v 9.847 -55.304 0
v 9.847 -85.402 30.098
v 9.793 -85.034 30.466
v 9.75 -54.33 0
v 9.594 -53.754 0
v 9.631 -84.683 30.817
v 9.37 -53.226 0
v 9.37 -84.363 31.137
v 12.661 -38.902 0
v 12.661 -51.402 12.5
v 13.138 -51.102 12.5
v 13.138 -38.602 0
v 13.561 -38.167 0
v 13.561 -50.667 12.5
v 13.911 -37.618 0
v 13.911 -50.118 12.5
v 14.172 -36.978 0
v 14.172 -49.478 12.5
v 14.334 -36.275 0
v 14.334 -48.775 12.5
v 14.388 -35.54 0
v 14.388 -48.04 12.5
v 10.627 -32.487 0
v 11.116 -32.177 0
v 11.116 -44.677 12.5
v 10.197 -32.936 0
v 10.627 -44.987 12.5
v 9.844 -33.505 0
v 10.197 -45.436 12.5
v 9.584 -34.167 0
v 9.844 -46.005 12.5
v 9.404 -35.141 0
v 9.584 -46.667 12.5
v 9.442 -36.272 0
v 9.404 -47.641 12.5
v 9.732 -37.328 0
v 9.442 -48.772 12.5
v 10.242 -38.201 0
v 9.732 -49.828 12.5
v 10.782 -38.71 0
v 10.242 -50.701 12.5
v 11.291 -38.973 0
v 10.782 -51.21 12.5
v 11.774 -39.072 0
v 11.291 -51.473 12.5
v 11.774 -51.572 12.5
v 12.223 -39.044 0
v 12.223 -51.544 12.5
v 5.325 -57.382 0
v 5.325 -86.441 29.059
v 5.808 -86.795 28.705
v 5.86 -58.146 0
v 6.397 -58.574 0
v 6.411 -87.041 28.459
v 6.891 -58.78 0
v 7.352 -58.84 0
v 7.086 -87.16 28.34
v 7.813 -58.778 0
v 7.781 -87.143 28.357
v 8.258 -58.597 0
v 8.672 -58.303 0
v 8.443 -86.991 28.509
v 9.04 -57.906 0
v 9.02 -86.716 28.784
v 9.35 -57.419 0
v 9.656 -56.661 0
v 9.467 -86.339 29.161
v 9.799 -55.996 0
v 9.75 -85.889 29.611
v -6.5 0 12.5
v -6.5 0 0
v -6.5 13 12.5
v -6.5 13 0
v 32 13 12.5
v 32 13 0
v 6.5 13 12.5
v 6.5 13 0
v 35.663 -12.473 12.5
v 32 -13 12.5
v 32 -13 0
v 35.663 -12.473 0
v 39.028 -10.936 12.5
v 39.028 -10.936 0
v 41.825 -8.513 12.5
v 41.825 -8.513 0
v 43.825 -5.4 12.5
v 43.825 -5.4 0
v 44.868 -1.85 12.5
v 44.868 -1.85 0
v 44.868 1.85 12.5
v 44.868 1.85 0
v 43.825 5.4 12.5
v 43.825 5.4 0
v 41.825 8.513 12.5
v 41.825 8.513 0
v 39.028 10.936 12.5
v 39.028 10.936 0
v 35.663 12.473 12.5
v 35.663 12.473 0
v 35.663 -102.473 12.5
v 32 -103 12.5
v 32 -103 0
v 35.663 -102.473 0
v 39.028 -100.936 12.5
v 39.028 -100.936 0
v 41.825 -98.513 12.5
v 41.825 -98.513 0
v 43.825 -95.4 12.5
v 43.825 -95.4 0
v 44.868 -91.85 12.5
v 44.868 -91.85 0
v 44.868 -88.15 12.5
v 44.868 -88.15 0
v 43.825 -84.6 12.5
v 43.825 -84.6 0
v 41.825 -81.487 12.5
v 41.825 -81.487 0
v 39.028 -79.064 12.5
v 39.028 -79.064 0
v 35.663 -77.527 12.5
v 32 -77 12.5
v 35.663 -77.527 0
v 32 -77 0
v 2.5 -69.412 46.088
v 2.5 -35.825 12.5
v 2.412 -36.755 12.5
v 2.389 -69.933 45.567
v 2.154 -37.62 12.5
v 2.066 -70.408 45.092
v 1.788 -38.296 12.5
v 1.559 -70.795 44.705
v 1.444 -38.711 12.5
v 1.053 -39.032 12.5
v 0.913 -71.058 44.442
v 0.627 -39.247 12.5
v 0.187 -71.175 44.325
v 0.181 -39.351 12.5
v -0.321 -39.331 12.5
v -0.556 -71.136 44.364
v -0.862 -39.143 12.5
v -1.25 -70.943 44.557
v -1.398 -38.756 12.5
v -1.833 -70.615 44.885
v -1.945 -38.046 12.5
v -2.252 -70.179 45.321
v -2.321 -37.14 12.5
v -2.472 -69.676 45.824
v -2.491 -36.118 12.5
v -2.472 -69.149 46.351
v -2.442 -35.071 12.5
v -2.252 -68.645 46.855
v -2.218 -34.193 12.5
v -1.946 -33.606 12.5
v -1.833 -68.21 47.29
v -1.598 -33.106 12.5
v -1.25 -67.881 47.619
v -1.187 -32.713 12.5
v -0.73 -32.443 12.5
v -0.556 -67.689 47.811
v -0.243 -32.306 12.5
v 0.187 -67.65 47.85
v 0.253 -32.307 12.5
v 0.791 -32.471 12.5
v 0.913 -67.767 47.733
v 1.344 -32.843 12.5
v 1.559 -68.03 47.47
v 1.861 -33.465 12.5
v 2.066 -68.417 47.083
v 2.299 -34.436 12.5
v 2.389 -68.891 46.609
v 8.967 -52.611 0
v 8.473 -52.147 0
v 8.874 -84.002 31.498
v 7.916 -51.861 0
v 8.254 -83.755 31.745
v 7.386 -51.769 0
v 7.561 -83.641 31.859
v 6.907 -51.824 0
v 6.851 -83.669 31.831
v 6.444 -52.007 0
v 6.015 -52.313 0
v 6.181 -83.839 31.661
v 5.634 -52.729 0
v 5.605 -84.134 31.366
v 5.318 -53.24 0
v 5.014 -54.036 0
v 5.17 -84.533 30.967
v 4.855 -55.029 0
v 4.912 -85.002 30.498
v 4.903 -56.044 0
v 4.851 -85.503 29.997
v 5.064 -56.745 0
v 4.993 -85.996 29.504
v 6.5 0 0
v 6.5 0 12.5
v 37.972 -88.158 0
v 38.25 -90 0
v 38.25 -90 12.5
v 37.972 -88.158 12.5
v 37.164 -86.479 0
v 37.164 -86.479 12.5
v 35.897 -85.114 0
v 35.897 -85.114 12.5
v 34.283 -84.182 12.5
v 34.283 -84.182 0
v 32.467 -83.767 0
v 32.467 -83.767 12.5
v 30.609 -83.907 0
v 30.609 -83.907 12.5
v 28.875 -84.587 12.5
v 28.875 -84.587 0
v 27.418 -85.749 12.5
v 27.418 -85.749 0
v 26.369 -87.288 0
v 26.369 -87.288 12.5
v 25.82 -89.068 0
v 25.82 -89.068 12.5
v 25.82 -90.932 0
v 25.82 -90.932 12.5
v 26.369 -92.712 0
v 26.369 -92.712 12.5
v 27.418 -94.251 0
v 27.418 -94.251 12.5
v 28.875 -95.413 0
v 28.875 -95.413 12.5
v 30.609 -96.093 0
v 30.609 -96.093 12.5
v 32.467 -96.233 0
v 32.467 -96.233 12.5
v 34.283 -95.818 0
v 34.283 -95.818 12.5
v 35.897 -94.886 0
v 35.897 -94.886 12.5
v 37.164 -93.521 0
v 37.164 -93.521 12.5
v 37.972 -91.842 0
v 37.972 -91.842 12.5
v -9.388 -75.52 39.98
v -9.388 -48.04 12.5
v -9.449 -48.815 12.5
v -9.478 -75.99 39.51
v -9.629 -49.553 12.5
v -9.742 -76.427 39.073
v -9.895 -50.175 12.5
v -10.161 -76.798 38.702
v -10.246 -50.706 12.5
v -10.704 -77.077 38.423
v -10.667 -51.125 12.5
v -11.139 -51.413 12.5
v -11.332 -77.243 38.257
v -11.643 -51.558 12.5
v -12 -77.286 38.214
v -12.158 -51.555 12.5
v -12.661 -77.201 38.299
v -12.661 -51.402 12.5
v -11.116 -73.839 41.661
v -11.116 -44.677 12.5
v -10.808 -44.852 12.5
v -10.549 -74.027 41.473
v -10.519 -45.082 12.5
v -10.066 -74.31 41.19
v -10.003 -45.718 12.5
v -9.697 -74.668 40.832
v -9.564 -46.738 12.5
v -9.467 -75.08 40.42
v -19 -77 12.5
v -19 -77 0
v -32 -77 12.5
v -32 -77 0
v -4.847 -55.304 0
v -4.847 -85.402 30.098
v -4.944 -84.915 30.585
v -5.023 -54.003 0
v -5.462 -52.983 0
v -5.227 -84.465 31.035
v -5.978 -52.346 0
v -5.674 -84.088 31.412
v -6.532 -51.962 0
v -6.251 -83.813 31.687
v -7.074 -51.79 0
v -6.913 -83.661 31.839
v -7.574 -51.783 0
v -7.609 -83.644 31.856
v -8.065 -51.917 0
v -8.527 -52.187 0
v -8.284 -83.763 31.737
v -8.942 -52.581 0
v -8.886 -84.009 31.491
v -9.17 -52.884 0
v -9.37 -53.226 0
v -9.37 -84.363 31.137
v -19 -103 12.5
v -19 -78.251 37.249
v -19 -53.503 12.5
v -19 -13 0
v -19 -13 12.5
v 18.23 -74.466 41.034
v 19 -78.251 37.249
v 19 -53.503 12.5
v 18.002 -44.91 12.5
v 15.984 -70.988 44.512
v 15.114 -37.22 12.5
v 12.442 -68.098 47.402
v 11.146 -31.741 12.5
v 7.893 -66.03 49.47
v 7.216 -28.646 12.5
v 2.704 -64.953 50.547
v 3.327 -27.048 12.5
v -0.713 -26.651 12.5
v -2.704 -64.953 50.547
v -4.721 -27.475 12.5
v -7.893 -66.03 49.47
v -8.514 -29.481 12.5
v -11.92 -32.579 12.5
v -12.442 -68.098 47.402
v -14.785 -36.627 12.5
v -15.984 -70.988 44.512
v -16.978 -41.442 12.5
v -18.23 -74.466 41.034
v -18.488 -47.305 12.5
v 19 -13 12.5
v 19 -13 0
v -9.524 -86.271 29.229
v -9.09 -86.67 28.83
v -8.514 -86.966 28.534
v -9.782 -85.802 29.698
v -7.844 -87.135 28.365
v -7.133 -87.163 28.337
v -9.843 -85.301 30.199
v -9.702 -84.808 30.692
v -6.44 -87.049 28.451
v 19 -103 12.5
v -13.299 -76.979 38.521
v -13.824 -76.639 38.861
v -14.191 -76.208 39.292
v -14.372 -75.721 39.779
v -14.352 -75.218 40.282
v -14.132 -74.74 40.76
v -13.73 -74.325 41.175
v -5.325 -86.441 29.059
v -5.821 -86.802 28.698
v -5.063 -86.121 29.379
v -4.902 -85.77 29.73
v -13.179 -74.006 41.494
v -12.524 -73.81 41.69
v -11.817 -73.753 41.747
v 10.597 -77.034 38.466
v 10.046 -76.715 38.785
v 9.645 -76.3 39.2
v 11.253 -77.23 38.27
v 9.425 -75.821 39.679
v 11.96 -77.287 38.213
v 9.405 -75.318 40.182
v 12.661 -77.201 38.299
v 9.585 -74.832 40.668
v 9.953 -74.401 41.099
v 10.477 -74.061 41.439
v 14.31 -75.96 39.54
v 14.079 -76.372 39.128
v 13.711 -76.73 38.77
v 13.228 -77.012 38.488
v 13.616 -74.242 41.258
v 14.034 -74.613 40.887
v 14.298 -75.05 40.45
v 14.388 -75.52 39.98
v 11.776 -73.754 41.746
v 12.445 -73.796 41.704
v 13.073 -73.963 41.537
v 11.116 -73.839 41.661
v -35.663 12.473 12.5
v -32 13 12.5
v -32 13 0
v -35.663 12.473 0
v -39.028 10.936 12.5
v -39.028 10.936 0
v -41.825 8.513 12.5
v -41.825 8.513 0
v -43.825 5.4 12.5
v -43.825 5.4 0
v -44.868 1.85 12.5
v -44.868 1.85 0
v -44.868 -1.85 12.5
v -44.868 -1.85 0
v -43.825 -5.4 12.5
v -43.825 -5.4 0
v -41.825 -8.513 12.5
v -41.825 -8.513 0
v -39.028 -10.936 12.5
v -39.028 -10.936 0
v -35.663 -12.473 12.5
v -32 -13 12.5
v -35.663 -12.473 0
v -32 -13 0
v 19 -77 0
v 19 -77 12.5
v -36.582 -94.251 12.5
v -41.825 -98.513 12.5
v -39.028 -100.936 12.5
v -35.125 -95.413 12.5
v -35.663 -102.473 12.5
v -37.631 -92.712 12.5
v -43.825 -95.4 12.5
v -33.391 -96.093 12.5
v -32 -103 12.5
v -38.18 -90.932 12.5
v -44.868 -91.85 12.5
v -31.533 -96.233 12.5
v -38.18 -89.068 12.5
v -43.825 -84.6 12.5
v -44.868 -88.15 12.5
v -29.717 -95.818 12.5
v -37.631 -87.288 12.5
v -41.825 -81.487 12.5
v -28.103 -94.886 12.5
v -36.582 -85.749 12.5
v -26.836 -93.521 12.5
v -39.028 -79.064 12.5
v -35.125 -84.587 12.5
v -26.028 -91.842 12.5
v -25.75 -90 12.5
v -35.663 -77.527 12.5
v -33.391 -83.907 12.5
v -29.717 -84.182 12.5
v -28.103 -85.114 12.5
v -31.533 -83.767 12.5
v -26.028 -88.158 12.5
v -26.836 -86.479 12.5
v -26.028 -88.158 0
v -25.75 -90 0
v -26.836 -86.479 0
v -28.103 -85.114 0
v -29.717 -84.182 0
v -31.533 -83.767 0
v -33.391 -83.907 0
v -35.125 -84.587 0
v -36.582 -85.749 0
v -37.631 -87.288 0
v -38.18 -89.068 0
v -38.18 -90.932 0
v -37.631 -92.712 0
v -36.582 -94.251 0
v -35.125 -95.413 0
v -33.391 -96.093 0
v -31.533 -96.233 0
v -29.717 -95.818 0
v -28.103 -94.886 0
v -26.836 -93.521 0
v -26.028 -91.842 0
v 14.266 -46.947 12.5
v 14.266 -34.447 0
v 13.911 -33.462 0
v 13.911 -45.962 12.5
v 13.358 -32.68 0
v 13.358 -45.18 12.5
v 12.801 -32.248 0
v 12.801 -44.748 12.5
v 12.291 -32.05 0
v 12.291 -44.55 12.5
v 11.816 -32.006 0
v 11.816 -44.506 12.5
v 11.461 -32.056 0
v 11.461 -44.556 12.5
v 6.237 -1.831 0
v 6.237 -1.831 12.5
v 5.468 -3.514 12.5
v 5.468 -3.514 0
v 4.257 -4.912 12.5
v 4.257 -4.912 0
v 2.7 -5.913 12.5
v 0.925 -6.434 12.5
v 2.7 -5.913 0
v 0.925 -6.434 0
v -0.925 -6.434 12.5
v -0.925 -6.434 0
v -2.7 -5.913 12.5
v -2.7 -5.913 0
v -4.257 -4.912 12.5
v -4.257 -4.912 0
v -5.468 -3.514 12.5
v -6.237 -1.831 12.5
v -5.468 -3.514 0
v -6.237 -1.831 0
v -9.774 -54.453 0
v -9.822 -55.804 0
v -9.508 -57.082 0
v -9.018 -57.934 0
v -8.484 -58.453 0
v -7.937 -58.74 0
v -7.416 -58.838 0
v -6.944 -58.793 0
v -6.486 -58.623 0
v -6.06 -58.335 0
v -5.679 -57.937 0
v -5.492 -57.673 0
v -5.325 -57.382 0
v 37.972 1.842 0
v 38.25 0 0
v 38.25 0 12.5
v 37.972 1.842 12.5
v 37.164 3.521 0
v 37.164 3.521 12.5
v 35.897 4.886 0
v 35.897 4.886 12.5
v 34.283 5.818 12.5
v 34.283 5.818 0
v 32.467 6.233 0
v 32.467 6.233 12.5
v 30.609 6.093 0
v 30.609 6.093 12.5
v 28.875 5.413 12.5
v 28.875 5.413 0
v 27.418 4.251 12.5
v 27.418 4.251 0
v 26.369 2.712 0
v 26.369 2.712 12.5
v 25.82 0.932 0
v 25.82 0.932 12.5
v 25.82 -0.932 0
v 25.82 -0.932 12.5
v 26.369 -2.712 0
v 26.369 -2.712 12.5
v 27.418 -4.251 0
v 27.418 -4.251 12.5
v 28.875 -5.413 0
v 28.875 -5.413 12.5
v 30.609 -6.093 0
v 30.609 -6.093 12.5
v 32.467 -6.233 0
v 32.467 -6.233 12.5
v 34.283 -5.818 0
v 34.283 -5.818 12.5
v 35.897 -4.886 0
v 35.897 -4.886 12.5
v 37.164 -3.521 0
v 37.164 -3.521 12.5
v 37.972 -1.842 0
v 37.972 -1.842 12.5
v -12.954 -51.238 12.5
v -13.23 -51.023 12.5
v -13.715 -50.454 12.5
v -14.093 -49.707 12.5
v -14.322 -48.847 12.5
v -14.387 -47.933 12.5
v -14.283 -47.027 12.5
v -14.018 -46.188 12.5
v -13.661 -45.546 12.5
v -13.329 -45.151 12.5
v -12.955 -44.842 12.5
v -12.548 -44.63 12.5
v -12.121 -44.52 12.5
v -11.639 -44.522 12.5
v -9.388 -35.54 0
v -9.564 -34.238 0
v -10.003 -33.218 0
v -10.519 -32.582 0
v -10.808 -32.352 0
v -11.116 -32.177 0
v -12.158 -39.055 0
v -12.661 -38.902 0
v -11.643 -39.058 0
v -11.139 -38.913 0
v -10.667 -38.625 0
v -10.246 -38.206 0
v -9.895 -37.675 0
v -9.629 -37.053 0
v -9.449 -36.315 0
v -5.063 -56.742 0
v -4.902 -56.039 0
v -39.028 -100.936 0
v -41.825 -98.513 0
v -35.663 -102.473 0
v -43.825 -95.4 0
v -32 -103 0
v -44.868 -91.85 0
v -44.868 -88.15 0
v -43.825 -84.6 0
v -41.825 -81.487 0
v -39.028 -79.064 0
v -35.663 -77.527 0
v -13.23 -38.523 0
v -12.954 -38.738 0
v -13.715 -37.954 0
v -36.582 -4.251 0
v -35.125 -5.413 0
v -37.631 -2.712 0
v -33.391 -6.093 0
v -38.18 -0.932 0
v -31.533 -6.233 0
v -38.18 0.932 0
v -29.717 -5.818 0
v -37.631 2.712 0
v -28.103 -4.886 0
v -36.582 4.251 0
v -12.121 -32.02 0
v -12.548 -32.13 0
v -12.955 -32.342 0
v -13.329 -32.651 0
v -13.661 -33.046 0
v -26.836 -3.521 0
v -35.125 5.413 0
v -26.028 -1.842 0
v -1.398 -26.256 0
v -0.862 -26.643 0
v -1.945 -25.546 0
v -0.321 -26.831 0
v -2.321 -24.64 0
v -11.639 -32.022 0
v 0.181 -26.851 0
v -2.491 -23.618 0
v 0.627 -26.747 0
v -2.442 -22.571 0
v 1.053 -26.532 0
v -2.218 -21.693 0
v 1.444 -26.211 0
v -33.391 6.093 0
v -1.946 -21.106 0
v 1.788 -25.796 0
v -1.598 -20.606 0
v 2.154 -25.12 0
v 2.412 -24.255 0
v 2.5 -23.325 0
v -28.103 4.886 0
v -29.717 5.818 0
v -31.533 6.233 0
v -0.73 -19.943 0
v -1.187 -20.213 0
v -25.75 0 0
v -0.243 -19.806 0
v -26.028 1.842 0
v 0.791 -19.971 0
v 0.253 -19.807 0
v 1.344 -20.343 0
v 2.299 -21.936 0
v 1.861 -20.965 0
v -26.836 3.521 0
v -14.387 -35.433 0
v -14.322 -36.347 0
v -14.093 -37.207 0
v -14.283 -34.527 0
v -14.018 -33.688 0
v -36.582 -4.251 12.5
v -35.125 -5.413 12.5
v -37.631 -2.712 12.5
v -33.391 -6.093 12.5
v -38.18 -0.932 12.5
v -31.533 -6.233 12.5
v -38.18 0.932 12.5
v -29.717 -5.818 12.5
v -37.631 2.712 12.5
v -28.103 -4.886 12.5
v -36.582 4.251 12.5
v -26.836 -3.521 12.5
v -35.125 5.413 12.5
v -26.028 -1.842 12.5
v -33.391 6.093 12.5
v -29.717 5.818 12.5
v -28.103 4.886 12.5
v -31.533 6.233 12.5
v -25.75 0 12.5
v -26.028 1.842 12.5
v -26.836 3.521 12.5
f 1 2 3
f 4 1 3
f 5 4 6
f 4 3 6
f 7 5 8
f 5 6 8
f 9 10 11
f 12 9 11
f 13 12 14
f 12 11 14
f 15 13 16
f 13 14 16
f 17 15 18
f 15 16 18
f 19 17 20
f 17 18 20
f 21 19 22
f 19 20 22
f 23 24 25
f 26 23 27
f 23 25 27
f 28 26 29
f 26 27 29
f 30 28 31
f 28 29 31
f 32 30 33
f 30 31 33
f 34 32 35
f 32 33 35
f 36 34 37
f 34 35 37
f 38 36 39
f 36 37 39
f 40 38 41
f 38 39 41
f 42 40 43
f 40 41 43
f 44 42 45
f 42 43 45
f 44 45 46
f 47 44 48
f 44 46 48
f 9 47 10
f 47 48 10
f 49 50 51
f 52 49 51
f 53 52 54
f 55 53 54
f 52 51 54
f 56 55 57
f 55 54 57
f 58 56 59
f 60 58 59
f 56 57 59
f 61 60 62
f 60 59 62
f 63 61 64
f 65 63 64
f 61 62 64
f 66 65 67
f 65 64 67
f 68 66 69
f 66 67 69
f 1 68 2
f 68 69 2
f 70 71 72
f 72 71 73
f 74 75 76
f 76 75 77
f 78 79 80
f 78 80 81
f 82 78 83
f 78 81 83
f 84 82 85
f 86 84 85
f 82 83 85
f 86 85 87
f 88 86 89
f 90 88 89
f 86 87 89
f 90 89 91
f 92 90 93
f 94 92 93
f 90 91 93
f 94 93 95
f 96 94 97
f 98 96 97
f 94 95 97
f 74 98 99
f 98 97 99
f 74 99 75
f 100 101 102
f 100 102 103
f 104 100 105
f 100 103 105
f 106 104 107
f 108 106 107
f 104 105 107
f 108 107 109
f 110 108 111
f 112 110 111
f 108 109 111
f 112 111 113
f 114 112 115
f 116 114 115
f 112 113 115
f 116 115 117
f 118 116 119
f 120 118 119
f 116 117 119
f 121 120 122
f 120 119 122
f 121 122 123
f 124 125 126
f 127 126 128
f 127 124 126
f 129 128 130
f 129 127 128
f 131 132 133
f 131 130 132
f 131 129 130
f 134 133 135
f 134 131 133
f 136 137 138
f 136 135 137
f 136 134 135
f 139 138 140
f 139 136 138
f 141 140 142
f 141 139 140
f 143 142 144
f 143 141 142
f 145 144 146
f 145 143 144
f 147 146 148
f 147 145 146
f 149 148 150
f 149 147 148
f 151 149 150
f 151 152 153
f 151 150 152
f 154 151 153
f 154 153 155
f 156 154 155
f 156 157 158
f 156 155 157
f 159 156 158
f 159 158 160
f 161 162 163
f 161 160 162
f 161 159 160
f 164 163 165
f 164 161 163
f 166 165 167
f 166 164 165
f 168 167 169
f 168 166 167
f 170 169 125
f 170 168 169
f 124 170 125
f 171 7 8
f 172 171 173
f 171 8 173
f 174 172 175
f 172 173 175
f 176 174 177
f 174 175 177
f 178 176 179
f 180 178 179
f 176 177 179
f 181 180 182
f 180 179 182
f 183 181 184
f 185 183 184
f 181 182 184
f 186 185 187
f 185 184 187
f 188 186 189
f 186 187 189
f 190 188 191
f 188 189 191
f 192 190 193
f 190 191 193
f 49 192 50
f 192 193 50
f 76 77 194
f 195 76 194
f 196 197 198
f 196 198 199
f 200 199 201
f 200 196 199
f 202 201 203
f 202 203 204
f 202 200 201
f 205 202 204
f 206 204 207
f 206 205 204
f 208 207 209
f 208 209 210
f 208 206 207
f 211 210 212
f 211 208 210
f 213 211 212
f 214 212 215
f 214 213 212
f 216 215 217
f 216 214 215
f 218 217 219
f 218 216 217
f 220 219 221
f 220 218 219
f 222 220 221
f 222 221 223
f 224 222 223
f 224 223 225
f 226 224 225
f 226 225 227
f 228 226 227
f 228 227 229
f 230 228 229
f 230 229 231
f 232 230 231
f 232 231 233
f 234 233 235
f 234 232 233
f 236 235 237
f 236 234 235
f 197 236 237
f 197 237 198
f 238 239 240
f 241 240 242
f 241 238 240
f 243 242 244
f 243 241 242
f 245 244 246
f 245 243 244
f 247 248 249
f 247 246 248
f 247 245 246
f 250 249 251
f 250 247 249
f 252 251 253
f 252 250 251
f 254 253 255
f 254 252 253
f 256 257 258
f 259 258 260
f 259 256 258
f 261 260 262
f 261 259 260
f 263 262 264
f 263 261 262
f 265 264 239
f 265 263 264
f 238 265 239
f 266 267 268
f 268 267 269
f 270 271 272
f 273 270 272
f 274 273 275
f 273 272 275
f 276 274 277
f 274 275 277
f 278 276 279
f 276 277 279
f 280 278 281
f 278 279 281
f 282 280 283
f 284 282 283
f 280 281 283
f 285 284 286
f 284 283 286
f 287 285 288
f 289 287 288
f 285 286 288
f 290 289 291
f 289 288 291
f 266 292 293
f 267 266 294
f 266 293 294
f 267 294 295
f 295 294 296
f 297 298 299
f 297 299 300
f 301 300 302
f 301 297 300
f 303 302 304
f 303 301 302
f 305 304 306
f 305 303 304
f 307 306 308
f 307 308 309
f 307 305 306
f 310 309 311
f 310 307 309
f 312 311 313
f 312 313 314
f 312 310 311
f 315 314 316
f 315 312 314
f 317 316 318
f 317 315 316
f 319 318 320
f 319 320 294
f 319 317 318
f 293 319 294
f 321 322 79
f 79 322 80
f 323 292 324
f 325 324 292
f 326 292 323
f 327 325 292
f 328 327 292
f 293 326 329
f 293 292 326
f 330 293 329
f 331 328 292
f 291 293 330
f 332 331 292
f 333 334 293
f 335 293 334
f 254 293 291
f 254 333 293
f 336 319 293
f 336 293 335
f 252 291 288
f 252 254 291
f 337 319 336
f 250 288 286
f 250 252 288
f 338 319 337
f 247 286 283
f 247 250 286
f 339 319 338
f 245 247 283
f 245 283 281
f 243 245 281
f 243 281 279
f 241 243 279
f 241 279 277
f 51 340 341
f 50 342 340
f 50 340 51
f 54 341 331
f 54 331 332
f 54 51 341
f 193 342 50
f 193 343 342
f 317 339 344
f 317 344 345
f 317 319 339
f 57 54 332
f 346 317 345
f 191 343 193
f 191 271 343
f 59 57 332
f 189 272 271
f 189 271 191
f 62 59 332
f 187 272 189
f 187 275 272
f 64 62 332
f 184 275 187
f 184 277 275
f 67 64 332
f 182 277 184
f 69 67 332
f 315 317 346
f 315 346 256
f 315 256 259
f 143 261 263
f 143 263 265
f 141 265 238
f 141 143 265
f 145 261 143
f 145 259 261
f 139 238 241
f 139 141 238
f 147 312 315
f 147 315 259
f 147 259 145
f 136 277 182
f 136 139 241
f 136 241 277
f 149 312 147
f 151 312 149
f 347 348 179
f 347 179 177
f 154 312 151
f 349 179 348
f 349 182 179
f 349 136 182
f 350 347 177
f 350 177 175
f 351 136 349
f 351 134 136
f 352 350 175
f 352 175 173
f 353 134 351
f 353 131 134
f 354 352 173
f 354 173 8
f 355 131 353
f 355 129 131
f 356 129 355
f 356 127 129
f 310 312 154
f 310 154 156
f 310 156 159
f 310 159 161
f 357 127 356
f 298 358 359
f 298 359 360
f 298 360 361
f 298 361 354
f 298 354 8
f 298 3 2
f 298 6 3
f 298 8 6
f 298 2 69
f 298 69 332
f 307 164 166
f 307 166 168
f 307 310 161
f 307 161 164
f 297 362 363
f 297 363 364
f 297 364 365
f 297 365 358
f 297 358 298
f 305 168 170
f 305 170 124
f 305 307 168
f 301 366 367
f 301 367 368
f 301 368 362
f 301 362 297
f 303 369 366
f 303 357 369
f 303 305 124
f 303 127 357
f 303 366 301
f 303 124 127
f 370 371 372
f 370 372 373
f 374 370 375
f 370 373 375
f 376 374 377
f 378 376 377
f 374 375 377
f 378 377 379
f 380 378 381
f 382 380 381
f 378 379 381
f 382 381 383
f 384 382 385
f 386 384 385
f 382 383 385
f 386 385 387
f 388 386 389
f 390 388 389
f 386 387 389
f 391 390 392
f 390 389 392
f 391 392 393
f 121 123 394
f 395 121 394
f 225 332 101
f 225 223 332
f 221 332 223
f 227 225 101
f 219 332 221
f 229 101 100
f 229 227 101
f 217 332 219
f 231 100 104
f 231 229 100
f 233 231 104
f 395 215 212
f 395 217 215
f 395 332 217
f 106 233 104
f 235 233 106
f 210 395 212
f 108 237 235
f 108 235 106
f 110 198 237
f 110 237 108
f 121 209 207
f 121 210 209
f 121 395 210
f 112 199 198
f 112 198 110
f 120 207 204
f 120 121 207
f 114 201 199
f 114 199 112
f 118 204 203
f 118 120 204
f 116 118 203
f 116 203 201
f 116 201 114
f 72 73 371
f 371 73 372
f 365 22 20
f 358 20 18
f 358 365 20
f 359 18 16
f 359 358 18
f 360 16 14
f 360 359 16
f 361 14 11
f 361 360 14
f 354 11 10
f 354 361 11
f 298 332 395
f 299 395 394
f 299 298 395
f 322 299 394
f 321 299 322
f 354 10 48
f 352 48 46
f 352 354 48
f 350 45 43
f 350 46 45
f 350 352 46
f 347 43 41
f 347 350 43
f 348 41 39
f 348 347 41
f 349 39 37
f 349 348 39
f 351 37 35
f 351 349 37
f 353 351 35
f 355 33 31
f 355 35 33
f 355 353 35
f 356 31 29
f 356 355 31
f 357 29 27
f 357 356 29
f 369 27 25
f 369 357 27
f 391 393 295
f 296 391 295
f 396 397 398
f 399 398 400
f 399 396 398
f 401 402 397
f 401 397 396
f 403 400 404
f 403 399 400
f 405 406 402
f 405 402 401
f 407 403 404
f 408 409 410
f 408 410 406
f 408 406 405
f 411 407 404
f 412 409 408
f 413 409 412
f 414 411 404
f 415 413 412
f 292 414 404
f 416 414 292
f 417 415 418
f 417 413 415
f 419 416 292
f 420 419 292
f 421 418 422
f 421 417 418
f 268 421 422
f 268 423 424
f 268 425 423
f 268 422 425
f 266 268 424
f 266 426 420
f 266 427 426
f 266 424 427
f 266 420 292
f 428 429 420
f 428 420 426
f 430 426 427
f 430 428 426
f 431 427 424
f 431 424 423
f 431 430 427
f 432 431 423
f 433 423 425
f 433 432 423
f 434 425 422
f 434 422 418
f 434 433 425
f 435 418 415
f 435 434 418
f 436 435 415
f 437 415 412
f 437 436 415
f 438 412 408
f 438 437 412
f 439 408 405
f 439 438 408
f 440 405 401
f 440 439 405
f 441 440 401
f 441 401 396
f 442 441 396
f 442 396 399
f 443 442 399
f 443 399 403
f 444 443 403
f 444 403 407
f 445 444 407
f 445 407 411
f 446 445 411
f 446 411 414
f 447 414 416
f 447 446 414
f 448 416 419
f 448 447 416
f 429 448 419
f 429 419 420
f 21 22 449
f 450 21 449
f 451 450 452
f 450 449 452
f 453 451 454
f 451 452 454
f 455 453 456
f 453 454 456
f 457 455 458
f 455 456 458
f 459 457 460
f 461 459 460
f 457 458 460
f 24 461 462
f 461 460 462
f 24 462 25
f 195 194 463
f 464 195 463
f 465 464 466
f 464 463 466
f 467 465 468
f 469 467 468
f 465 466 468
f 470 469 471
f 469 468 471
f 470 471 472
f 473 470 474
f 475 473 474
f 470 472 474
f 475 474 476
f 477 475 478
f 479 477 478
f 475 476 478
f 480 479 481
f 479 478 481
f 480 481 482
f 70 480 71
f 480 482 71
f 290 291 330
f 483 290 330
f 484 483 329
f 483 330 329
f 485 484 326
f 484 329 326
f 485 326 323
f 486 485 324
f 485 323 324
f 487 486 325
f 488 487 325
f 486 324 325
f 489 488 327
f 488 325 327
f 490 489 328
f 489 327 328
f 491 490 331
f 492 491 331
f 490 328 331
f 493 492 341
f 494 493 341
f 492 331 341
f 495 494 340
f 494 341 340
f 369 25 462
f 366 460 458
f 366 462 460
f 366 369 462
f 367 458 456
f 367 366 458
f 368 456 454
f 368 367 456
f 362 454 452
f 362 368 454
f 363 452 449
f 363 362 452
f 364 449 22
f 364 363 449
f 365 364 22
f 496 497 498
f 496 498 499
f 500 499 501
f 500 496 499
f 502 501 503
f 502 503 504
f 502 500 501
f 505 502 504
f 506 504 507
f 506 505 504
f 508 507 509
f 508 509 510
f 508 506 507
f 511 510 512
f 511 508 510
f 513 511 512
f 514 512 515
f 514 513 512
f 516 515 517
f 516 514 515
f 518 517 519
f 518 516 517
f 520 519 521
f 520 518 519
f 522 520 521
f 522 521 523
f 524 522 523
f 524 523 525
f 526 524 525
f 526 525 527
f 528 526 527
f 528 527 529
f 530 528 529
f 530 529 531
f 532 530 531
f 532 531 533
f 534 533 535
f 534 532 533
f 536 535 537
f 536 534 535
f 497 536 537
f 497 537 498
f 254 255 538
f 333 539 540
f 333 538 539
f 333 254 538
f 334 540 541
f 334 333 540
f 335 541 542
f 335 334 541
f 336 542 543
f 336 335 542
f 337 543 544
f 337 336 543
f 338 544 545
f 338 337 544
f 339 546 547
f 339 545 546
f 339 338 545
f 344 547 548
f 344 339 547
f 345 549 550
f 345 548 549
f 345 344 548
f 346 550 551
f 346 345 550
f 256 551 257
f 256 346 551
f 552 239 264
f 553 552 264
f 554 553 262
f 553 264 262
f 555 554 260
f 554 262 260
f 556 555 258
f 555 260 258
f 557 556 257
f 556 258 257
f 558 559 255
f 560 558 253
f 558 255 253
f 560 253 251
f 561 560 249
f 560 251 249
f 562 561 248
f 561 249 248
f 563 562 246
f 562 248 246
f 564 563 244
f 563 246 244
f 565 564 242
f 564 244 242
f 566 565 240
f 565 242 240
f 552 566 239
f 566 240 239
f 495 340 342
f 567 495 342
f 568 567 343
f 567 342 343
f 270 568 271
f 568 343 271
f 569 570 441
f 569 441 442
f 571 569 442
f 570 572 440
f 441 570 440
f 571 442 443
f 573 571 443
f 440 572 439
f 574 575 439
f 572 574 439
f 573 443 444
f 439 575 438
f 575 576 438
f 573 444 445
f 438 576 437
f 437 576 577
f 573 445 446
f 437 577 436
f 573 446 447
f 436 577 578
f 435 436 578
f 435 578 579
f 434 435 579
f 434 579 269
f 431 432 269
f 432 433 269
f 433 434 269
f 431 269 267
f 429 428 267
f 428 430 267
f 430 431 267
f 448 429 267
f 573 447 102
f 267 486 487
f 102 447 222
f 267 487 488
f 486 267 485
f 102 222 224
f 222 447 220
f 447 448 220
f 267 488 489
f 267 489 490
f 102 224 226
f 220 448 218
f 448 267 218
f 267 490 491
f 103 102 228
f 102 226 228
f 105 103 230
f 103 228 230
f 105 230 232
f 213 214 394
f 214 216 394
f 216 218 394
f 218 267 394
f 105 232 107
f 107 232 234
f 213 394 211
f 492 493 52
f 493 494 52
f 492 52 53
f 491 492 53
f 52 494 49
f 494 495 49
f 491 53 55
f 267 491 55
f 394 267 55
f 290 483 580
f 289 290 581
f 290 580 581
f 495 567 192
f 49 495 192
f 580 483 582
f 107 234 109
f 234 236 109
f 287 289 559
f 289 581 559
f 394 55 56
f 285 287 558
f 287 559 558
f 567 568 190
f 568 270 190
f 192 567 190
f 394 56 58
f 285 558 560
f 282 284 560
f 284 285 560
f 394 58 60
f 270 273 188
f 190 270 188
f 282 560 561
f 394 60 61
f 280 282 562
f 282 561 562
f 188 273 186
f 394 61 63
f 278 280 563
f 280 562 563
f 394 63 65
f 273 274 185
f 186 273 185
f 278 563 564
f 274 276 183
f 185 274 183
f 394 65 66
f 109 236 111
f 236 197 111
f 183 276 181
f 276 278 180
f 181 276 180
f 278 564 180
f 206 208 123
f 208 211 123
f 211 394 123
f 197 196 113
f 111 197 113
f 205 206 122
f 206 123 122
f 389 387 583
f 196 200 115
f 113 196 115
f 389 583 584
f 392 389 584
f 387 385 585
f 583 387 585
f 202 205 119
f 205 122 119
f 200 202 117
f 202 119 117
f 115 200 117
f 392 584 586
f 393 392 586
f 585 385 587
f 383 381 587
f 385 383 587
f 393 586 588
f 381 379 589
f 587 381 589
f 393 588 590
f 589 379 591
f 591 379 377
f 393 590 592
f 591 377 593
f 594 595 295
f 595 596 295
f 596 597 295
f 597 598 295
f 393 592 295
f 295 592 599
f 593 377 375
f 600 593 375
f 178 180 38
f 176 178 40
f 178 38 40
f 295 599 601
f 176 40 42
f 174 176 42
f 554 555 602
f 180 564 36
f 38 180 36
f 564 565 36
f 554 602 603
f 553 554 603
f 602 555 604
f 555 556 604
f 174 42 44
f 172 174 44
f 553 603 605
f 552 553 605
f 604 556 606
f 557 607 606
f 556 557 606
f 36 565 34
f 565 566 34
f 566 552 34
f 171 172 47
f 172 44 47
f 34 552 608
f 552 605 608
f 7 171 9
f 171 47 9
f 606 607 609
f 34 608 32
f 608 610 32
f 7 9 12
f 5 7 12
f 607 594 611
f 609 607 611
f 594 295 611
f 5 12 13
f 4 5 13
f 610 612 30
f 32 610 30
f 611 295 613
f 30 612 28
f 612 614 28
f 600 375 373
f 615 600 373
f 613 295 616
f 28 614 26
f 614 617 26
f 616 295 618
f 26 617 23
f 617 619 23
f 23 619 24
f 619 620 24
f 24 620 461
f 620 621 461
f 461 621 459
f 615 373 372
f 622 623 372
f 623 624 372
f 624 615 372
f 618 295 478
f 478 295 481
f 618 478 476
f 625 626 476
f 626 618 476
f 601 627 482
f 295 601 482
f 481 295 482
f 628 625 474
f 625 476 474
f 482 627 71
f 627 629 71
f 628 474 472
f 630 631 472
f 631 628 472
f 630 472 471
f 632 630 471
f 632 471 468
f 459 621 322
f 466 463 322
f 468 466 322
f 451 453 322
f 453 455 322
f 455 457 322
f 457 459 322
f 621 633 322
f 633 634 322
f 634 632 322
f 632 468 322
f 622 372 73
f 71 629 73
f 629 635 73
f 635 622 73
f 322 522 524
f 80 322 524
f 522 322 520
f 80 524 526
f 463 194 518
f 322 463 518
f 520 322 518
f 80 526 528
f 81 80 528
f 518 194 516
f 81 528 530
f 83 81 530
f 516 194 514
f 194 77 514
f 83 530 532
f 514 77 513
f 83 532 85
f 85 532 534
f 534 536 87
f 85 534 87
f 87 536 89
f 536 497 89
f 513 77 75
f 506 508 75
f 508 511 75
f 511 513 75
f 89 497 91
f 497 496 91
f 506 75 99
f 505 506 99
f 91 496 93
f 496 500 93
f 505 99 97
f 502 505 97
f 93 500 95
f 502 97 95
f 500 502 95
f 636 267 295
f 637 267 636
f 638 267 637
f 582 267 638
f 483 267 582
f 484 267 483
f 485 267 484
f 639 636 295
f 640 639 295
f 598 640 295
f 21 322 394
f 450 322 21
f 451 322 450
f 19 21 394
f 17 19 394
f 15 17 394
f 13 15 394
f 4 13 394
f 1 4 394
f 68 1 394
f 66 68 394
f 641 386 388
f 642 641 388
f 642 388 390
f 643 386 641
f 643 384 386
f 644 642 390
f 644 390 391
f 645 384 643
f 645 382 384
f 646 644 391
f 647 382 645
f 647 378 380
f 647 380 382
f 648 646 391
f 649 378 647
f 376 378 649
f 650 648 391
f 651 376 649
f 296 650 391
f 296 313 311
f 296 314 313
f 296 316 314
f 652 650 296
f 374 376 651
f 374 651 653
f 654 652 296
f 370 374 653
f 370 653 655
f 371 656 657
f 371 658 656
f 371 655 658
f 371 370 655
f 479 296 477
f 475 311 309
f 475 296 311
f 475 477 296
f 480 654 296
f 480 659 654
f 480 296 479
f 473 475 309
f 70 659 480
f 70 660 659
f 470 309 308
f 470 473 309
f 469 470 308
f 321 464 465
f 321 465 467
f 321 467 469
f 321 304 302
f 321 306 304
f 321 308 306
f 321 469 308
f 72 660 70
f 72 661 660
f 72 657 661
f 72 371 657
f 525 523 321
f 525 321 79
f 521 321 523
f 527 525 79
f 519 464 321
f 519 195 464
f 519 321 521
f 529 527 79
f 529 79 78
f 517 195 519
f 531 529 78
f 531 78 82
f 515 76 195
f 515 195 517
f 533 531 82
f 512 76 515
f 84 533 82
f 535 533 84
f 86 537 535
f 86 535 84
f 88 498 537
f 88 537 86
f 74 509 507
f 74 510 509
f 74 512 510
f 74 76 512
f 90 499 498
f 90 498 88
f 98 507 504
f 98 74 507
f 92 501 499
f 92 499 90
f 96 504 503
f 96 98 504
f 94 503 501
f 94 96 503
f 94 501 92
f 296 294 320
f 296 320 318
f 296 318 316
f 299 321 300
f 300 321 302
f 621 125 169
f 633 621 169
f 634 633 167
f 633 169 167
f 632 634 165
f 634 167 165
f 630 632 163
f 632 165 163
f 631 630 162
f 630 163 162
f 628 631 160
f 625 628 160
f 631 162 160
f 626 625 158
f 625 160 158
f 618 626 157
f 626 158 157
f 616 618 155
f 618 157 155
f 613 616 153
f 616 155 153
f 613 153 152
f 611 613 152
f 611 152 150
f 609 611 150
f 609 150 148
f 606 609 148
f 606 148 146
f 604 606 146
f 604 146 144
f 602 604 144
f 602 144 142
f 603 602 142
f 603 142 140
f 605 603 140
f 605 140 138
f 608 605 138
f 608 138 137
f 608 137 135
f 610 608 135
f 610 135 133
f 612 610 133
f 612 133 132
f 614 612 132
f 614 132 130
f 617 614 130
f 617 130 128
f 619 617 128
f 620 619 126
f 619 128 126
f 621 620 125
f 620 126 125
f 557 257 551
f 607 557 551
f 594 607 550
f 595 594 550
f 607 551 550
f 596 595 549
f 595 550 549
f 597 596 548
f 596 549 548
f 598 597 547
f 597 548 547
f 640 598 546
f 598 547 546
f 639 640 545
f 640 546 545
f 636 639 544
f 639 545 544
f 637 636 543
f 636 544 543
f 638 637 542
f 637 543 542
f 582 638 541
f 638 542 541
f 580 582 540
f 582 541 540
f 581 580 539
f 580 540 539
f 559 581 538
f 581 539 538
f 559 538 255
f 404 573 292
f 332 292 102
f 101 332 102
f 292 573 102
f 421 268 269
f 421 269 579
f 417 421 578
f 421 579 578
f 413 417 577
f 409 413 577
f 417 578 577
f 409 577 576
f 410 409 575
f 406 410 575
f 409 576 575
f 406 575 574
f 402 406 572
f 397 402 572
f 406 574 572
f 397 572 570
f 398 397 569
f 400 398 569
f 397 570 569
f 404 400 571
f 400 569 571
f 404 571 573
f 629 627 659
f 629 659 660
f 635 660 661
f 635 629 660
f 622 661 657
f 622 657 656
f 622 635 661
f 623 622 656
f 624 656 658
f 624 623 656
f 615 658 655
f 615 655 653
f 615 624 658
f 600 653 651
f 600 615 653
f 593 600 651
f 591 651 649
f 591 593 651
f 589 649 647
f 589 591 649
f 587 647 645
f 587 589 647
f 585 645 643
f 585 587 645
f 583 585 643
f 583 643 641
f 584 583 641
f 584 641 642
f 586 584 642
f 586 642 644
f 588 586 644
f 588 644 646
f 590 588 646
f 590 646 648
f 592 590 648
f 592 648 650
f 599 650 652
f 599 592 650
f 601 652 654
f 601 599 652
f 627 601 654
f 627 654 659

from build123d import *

# Parameters (mm, degrees)
F0_R     = 6.25
F1_DEPTH = 12.5
F3_DEPTH = 19
F6_DEPTH = 90.8642213825


with BuildPart() as f1:
    # F0 (on Top) → F1 (new body)
    with BuildSketch(Plane.XY):
        with BuildLine():
            ThreePointArc((6.5, 0), (0, -6.5), (-6.5, 0))
            Line((-6.5, 0), (-6.5, 13))
            Line((-6.5, 13), (-32, 13))
            ThreePointArc((-32, 13), (-45, 0), (-32, -13))
            Line((-32, -13), (-19, -13))
            Line((-19, -13), (-19, -77))
            Line((-19, -77), (-32, -77))
            ThreePointArc((-32, -77), (-45, -90), (-32, -103))
            Line((-32, -103), (32, -103))
            ThreePointArc((32, -103), (45, -90), (32, -77))
            Line((32, -77), (19, -77))
            Line((19, -77), (19, -13))
            Line((19, -13), (32, -13))
            ThreePointArc((32, -13), (45, 0), (32, 13))
            Line((32, 13), (6.5, 13))
            Line((6.5, 13), (6.5, 0))
        make_face()
        with Locations((-32, -90)):
            Circle(F0_R, mode=Mode.SUBTRACT)
        with Locations((32, -90)):
            Circle(F0_R, mode=Mode.SUBTRACT)
        with Locations((-32, 0)):
            Circle(F0_R, mode=Mode.SUBTRACT)
        with Locations((32, 0)):
            Circle(F0_R, mode=Mode.SUBTRACT)
    extrude(amount=F1_DEPTH)

    # F2 (on Right) → F3 (join, symmetric)
    with BuildSketch(Plane.YZ):
        Polygon((-103, 12.5), (-77, 12.5), (-53.5025253169, 12.5), (-78.2512626585, 37.2487373415), align=None)
    extrude(amount=F3_DEPTH, both=True)

    # F4 (on face) → F5 (join, up to the next surface of F1)
    with BuildSketch(Plane(origin=(0, -57.75, 57.75), x_dir=(1, 0, 0), z_dir=(0, -0.7071067812, 0.7071067812))):
        with BuildLine():
            ThreePointArc((19, -28.9931636974), (0, -9.9931636974), (-19, -28.9931636974))
            Line((-19, -28.9931636974), (-13.143277803, -28.9931636974))
            Line((-13.143277803, -28.9931636974), (-12.6607489396, -27.5080925584))
            ThreePointArc((-12.6607489396, -27.5080925584), (-14.2658477444, -24.3579087818), (-11.1156639678, -22.752809977))
            Line((-11.1156639678, -22.752809977), (-9.0817816001, -16.4931636974))
            Line((-9.0817816001, -16.4931636974), (-2.5, -16.4931636974))
            ThreePointArc((-2.5, -16.4931636974), (0, -13.9931636974), (2.5, -16.4931636974))
            Line((2.5, -16.4931636974), (9.0817816001, -16.4931636974))
            Line((9.0817816001, -16.4931636974), (11.1156639678, -22.752809977))
            ThreePointArc((11.1156639678, -22.752809977), (13.3576695844, -23.1079087818), (14.3882064537, -25.1304512677))
            ThreePointArc((14.3882064537, -25.1304512677), (13.9107489396, -26.5999143984), (12.6607489396, -27.5080925584))
            Line((12.6607489396, -27.5080925584), (13.143277803, -28.9931636974))
            Line((13.143277803, -28.9931636974), (19, -28.9931636974))
        make_face()
        with BuildLine():
            Line((-12.6607489396, -27.5080925584), (-13.143277803, -28.9931636974))
            Line((-13.143277803, -28.9931636974), (-7.5, -28.9931636974))
            ThreePointArc((-7.5, -28.9931636974), (0, -21.4931636974), (7.5, -28.9931636974))
            Line((7.5, -28.9931636974), (13.143277803, -28.9931636974))
            Line((13.143277803, -28.9931636974), (12.6607489396, -27.5080925584))
            ThreePointArc((12.6607489396, -27.5080925584), (9.510565163, -25.9029937536), (11.1156639678, -22.752809977))
            Line((11.1156639678, -22.752809977), (9.0817816001, -16.4931636974))
            Line((9.0817816001, -16.4931636974), (2.5, -16.4931636974))
            ThreePointArc((2.5, -16.4931636974), (0, -18.9931636974), (-2.5, -16.4931636974))
            Line((-2.5, -16.4931636974), (-9.0817816001, -16.4931636974))
            Line((-9.0817816001, -16.4931636974), (-11.1156639678, -22.752809977))
            ThreePointArc((-11.1156639678, -22.752809977), (-9.8656639678, -23.660988137), (-9.3882064537, -25.1304512677))
            ThreePointArc((-9.3882064537, -25.1304512677), (-10.418743323, -27.1529937536), (-12.6607489396, -27.5080925584))
        make_face()
        with BuildLine():
            ThreePointArc((7.5, -28.9931636974), (0, -21.4931636974), (-7.5, -28.9931636974))
            Line((-7.5, -28.9931636974), (7.5, -28.9931636974))
        make_face()
    extrude(until=Until.NEXT, dir=(0, 0.7071067812, -0.7071067812))

    # F4 (on face) → F6 (cut, through all)
    with BuildSketch(Plane(origin=(0, -57.75, 57.75), x_dir=(1, 0, 0), z_dir=(0, -0.7071067812, 0.7071067812))):
        with BuildLine():
            Line((2.5, -16.4931636974), (-2.5, -16.4931636974))
            ThreePointArc((-2.5, -16.4931636974), (0, -18.9931636974), (2.5, -16.4931636974))
        make_face()
        with BuildLine():
            ThreePointArc((2.5, -16.4931636974), (0, -13.9931636974), (-2.5, -16.4931636974))
            Line((-2.5, -16.4931636974), (2.5, -16.4931636974))
        make_face()
        with BuildLine():
            Line((11.1156639678, -22.752809977), (12.6607489396, -27.5080925584))
            ThreePointArc((12.6607489396, -27.5080925584), (13.9107489396, -26.5999143984), (14.3882064537, -25.1304512677))
            ThreePointArc((14.3882064537, -25.1304512677), (13.3576695844, -23.1079087818), (11.1156639678, -22.752809977))
        make_face()
        with BuildLine():
            ThreePointArc((11.1156639678, -22.752809977), (9.510565163, -25.9029937536), (12.6607489396, -27.5080925584))
            Line((12.6607489396, -27.5080925584), (11.1156639678, -22.752809977))
        make_face()
        with BuildLine():
            ThreePointArc((-11.1156639678, -22.752809977), (-14.2658477444, -24.3579087818), (-12.6607489396, -27.5080925584))
            Line((-12.6607489396, -27.5080925584), (-11.1156639678, -22.752809977))
        make_face()
        with BuildLine():
            Line((-11.1156639678, -22.752809977), (-12.6607489396, -27.5080925584))
            ThreePointArc((-12.6607489396, -27.5080925584), (-10.418743323, -27.1529937536), (-9.3882064537, -25.1304512677))
            ThreePointArc((-9.3882064537, -25.1304512677), (-9.8656639678, -23.660988137), (-11.1156639678, -22.752809977))
        make_face()
        with BuildLine():
            Line((-5.3247731677, -40.5753392578), (-9.3698581396, -37.6364129963))
            ThreePointArc((-9.3698581396, -37.6364129963), (-8.8167787844, -41.128418613), (-5.3247731677, -40.5753392578))
        make_face()
        with BuildLine():
            ThreePointArc((-4.8473156537, -39.1058761271), (-6.5747731677, -36.7282348363), (-9.3698581396, -37.6364129963))
            Line((-9.3698581396, -37.6364129963), (-5.3247731677, -40.5753392578))
            ThreePointArc((-5.3247731677, -40.5753392578), (-4.9696743629, -39.878418613), (-4.8473156537, -39.1058761271))
        make_face()
        with BuildLine():
            ThreePointArc((9.8473156537, -39.1058761271), (9.7249569444, -38.3333336411), (9.3698581396, -37.6364129963))
            Line((9.3698581396, -37.6364129963), (5.3247731677, -40.5753392578))
            ThreePointArc((5.3247731677, -40.5753392578), (8.1198581396, -41.4835174178), (9.8473156537, -39.1058761271))
        make_face()
        with BuildLine():
            Line((5.3247731677, -40.5753392578), (9.3698581396, -37.6364129963))
            ThreePointArc((9.3698581396, -37.6364129963), (5.8778525229, -37.0833336411), (5.3247731677, -40.5753392578))
        make_face()
    extrude(amount=-F6_DEPTH, mode=Mode.SUBTRACT)


solid = f1.part
